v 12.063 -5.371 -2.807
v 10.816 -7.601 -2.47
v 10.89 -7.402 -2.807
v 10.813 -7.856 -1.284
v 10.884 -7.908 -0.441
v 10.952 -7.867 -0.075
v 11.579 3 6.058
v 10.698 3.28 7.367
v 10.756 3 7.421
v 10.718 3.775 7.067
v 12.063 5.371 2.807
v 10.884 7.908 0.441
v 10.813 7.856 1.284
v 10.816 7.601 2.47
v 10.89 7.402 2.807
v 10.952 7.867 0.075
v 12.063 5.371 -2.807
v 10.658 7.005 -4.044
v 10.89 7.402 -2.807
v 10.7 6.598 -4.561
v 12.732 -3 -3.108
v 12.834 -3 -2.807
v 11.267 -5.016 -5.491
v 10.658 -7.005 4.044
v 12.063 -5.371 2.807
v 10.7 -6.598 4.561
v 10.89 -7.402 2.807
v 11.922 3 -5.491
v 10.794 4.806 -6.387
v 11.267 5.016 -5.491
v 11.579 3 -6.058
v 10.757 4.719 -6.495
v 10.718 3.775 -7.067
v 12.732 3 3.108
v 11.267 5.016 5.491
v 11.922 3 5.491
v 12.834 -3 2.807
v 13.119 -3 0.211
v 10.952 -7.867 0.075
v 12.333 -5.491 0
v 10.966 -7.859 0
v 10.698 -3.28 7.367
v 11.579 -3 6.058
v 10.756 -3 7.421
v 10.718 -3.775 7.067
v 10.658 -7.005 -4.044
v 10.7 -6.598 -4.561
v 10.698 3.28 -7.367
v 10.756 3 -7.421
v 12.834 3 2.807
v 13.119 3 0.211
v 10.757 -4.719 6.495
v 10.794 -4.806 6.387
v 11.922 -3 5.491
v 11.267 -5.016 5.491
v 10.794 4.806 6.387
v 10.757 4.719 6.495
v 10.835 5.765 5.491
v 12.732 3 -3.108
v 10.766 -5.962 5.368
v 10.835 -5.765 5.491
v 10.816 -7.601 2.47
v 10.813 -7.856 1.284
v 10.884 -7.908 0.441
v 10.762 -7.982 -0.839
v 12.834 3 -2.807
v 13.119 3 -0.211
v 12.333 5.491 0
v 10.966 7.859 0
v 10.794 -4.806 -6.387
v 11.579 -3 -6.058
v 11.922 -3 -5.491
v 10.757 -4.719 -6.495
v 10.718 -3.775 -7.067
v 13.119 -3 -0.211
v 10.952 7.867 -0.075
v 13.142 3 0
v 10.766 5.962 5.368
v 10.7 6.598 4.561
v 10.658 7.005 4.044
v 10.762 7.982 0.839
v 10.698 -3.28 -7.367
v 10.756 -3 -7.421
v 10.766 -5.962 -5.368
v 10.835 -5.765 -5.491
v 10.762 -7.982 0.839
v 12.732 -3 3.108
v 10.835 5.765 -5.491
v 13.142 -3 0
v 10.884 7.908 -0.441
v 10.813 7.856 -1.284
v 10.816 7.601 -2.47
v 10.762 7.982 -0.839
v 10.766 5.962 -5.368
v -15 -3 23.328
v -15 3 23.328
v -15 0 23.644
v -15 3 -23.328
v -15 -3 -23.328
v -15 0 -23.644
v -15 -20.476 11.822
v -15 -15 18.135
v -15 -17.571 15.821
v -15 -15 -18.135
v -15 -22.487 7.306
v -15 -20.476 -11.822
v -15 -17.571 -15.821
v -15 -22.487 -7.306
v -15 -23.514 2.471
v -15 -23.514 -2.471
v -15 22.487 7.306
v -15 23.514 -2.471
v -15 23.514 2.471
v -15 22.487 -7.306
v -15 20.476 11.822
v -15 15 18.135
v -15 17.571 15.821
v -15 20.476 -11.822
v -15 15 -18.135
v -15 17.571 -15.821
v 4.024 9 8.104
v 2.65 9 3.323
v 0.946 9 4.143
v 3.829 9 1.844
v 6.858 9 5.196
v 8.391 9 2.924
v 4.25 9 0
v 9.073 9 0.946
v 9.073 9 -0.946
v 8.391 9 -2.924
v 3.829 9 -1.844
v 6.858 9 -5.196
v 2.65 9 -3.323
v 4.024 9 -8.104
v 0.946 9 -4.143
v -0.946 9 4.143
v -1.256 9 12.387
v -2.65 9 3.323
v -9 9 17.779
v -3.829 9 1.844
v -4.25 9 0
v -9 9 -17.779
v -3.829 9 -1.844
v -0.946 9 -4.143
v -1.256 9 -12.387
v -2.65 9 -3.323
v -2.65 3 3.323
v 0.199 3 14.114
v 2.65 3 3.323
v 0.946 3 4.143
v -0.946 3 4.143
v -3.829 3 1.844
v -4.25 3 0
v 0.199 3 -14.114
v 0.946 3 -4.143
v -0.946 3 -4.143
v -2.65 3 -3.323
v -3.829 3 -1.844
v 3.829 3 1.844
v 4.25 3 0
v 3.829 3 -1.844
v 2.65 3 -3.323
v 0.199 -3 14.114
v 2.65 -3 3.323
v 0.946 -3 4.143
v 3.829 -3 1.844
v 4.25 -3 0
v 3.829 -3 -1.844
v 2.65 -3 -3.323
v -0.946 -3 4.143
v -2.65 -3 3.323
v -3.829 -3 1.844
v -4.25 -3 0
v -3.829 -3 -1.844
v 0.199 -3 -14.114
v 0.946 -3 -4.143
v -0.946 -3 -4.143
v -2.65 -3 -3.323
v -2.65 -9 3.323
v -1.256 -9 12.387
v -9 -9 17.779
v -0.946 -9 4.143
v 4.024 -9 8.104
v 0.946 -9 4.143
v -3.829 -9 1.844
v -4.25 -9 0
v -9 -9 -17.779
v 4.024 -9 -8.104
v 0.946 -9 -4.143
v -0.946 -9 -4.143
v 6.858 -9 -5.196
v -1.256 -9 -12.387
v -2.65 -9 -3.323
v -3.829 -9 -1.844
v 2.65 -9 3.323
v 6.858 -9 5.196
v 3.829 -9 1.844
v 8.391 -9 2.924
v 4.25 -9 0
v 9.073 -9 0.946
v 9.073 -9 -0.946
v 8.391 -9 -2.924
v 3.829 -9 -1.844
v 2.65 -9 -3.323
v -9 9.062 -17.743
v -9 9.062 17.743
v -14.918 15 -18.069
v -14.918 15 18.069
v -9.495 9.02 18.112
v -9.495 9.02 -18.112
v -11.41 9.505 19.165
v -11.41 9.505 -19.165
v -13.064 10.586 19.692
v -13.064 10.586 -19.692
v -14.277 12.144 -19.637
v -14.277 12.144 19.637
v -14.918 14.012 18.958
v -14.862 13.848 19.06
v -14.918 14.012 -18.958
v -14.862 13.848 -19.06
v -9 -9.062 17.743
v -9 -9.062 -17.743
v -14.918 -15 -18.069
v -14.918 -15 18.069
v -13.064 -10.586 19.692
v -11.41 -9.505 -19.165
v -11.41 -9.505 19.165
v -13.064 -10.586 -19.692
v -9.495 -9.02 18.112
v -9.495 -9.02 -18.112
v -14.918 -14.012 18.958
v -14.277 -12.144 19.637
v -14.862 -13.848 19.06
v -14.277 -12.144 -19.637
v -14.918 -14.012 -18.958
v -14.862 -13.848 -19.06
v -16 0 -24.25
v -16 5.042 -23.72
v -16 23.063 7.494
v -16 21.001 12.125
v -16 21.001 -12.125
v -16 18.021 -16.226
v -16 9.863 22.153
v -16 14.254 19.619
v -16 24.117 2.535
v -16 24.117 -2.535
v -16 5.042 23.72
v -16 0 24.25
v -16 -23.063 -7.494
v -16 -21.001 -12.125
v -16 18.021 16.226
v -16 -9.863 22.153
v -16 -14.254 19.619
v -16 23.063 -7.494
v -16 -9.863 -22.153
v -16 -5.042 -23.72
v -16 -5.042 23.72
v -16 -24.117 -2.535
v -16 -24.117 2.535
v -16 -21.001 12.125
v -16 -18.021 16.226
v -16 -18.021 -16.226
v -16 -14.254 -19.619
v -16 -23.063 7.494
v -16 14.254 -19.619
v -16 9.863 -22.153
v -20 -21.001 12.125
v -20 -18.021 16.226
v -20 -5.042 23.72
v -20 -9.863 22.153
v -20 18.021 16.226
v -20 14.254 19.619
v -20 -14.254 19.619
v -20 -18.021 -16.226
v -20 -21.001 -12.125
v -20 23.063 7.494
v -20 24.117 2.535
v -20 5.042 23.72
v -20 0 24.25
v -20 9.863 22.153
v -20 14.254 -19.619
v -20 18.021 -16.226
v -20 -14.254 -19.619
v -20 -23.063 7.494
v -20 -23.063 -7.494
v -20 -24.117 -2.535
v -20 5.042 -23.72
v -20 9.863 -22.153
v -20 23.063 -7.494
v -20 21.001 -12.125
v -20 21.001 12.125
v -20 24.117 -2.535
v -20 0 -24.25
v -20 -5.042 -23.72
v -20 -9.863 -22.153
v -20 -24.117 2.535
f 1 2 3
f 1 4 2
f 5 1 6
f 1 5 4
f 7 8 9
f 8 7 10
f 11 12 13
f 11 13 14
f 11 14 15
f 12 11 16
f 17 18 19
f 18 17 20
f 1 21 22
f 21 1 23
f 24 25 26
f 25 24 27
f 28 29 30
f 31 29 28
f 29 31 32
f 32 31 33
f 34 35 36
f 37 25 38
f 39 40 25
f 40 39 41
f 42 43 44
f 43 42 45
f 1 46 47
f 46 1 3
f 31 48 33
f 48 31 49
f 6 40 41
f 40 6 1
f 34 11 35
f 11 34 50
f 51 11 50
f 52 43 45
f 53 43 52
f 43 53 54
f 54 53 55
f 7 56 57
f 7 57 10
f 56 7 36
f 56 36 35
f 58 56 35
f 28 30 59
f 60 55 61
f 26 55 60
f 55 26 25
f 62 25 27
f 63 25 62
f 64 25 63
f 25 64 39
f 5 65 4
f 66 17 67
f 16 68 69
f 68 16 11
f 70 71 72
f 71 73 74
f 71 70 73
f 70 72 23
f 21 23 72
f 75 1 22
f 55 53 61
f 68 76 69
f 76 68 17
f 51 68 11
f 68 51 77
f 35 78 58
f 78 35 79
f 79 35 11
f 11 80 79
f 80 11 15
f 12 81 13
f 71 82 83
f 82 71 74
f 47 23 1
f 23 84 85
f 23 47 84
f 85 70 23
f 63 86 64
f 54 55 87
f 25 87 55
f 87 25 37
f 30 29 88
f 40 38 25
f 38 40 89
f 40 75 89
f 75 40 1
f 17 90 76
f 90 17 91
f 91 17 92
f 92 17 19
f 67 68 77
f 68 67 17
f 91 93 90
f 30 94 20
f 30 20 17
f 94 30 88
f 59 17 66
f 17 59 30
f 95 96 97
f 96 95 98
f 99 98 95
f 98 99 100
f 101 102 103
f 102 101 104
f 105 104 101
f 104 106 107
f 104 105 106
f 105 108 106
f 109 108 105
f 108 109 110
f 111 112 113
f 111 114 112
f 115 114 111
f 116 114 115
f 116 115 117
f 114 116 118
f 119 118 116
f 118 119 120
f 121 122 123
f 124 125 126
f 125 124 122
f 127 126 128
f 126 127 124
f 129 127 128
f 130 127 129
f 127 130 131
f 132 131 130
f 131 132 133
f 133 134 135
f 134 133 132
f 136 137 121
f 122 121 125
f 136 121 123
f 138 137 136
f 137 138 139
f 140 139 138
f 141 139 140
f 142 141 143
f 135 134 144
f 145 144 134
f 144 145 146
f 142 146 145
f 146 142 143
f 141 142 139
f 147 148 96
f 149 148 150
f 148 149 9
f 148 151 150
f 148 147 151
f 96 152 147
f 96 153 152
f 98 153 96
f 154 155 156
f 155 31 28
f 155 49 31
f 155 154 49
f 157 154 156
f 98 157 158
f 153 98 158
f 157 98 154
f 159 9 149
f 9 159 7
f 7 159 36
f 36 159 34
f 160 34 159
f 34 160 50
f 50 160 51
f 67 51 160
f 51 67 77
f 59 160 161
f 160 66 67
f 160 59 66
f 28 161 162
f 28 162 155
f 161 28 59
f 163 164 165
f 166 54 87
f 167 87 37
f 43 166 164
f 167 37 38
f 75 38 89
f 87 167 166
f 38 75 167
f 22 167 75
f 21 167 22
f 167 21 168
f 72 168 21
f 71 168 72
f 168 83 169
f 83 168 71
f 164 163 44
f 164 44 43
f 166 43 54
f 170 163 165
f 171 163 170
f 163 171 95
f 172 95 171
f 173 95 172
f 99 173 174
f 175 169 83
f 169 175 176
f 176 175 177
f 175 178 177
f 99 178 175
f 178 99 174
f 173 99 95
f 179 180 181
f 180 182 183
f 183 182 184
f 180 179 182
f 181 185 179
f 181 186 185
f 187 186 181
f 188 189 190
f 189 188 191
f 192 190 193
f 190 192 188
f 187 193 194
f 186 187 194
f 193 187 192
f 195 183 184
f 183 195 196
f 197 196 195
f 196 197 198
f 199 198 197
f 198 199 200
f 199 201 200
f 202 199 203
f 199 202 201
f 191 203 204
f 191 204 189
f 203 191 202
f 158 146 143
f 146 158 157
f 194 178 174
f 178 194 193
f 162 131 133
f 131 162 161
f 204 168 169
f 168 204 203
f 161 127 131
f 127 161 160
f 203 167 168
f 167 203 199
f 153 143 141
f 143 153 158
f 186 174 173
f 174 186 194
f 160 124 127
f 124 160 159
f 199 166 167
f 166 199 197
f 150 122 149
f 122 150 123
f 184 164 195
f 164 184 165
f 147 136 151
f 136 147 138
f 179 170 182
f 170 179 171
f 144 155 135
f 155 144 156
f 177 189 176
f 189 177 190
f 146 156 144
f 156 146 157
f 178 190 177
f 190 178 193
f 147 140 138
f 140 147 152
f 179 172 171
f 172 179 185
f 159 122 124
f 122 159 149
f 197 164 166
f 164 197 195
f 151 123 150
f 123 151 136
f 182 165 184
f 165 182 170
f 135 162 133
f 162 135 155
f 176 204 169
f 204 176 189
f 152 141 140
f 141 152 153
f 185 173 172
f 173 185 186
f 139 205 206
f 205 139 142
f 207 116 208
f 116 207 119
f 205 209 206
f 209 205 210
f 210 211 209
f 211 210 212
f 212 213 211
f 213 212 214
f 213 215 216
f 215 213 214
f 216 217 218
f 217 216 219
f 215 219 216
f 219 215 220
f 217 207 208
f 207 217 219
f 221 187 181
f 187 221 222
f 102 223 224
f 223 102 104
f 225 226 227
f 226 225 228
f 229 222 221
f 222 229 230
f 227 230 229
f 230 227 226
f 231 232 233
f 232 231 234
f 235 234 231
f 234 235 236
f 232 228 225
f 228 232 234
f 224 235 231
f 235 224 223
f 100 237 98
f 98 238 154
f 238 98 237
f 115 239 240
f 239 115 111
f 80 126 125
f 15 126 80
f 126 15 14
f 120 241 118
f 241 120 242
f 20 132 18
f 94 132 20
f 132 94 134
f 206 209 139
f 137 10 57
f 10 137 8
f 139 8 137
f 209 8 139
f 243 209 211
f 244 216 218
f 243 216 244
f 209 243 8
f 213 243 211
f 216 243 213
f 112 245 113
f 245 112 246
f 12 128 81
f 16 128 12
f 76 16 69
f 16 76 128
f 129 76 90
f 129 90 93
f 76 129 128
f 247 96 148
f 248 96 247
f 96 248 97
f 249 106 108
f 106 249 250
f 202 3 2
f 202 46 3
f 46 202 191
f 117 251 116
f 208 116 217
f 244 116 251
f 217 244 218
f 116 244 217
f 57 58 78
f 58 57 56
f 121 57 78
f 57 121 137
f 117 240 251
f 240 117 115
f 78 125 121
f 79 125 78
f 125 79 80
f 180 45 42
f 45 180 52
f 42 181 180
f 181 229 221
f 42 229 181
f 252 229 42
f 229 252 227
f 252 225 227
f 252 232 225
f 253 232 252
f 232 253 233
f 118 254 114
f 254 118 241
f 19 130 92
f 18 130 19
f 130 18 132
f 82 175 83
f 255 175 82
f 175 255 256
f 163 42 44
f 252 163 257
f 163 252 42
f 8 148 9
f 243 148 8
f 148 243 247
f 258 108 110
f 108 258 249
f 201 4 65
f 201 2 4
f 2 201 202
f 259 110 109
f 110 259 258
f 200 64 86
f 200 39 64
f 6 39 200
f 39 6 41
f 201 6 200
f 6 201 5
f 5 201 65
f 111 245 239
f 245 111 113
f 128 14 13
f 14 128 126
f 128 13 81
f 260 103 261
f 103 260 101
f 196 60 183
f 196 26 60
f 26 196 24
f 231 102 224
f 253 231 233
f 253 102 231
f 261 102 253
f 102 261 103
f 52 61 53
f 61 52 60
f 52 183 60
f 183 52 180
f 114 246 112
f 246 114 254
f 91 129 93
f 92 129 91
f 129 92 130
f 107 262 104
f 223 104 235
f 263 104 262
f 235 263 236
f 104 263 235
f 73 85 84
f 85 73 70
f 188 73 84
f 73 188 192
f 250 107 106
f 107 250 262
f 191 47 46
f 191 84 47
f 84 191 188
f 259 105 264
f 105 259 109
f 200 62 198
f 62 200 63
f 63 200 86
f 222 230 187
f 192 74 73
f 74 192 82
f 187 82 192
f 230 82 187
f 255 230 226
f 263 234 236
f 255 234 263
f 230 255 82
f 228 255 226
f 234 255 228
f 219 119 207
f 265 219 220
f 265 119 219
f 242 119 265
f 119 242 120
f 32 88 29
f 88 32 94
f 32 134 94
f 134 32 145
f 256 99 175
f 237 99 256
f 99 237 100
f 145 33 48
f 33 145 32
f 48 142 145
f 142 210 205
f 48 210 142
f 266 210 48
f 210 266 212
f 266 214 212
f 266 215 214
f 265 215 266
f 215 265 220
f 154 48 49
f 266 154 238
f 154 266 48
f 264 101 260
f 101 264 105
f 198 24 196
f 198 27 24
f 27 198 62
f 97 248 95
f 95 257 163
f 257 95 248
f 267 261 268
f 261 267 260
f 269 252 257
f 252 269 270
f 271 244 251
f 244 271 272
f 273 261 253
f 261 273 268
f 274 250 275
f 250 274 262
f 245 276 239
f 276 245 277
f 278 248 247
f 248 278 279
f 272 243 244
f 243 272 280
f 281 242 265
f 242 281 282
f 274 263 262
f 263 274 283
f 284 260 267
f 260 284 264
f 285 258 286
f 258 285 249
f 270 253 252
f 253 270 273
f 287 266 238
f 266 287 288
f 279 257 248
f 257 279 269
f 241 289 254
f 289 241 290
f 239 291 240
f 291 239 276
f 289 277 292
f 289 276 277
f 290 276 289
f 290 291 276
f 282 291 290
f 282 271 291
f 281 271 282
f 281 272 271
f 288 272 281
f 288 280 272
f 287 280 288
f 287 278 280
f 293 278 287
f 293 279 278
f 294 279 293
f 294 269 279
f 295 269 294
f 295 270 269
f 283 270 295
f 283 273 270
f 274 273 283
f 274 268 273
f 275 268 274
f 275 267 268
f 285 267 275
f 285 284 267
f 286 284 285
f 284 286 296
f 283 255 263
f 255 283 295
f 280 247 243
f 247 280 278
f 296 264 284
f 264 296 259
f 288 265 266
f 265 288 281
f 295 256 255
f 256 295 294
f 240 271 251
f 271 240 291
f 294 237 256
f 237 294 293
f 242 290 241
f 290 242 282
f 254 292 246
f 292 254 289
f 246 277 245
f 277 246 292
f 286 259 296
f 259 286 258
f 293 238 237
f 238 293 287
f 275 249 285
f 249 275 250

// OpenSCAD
ShplRoz();

    gikLen = 2200;
    diamVnesh = 48.5;
    platformThickns = 5;
    ushiThickns = 6;
    lenA = 40;
    shplintDia = 8.5;
    shplintHoleHeight = 15;

module ShplRoz() {

    intersection() {
        
        union() {
            
            //Цилиндр
            translate([+platformThickns-1,0,0]) 
            rotate([0,-90,0]) 
            cylinder(h=shplintHoleHeight+platformThickns, d=diamVnesh);   // Эта часть такая, какая нужна.    

            // Сфера
            sphere(d = ushiThickns*4.5);
       } 

      ConicBar();

    }

    //Цилиндр затычки, высотой 4мм 
    translate([-shplintHoleHeight-1,0,0]) 
    rotate([0,-90,0]) 
    cylinder(h=platformThickns-1, d=diamVnesh);    

}




module ConicBar() {
    
    intersection() { 

        union() {
                                        
            // Шайба 1мм
            translate([-shplintHoleHeight,0,0]) 
            rotate([0,-90,0]) 
            cylinder(h=1, d=diamVnesh);
    
            // Захваты упора с дырками.
            difference(){ 
                    
                // Захваты упора.
                union() {  
                    translate([-shplintHoleHeight,ushiThickns /2 ,-diamVnesh/2]) 
                    cube([lenA,ushiThickns ,diamVnesh]);    

                    translate([-shplintHoleHeight,-3*ushiThickns /2 ,-diamVnesh/2]) 
                    cube([lenA,ushiThickns ,diamVnesh]);
                        
                }
                    
                // Дырки для шплинта ( вырез цилиндра )
                translate([0 ,-1-ushiThickns*3/2,0]) 
                rotate([-90,0,0]) 
                cylinder(h=ushiThickns *3+2, d=shplintDia); 

            }
        
            // Стыки
            difference() {

                translate([-shplintHoleHeight,3*ushiThickns /2 ,-diamVnesh/2]) 
                cube([ushiThickns,ushiThickns ,diamVnesh]);    

                translate([-shplintHoleHeight + ushiThickns,5*ushiThickns/2,-diamVnesh/2]) 
                rotate([0,0,0]) 
                cylinder(h=diamVnesh, d=ushiThickns*2  );       
            }
            difference() {

                translate([-shplintHoleHeight,-5*ushiThickns /2 ,-diamVnesh/2]) 
                cube([ushiThickns,ushiThickns ,diamVnesh]);      

                translate([-shplintHoleHeight + ushiThickns,-5*ushiThickns/2,-diamVnesh/2]) 
                rotate([0,0,0]) 
                cylinder(h=diamVnesh, d=ushiThickns*2  );       
            }   
        
        }

        // Конус. Нужно оставить то, что в нём.
        translate([-shplintHoleHeight-1,0,0]) 
        rotate([0,90,0]) 
        cylinder(h=platformThickns*8, d1=diamVnesh, d2=0);   // Пересекаем с этим конусом.
   
    } // Пересечение
}   // Модуль ConicBar
